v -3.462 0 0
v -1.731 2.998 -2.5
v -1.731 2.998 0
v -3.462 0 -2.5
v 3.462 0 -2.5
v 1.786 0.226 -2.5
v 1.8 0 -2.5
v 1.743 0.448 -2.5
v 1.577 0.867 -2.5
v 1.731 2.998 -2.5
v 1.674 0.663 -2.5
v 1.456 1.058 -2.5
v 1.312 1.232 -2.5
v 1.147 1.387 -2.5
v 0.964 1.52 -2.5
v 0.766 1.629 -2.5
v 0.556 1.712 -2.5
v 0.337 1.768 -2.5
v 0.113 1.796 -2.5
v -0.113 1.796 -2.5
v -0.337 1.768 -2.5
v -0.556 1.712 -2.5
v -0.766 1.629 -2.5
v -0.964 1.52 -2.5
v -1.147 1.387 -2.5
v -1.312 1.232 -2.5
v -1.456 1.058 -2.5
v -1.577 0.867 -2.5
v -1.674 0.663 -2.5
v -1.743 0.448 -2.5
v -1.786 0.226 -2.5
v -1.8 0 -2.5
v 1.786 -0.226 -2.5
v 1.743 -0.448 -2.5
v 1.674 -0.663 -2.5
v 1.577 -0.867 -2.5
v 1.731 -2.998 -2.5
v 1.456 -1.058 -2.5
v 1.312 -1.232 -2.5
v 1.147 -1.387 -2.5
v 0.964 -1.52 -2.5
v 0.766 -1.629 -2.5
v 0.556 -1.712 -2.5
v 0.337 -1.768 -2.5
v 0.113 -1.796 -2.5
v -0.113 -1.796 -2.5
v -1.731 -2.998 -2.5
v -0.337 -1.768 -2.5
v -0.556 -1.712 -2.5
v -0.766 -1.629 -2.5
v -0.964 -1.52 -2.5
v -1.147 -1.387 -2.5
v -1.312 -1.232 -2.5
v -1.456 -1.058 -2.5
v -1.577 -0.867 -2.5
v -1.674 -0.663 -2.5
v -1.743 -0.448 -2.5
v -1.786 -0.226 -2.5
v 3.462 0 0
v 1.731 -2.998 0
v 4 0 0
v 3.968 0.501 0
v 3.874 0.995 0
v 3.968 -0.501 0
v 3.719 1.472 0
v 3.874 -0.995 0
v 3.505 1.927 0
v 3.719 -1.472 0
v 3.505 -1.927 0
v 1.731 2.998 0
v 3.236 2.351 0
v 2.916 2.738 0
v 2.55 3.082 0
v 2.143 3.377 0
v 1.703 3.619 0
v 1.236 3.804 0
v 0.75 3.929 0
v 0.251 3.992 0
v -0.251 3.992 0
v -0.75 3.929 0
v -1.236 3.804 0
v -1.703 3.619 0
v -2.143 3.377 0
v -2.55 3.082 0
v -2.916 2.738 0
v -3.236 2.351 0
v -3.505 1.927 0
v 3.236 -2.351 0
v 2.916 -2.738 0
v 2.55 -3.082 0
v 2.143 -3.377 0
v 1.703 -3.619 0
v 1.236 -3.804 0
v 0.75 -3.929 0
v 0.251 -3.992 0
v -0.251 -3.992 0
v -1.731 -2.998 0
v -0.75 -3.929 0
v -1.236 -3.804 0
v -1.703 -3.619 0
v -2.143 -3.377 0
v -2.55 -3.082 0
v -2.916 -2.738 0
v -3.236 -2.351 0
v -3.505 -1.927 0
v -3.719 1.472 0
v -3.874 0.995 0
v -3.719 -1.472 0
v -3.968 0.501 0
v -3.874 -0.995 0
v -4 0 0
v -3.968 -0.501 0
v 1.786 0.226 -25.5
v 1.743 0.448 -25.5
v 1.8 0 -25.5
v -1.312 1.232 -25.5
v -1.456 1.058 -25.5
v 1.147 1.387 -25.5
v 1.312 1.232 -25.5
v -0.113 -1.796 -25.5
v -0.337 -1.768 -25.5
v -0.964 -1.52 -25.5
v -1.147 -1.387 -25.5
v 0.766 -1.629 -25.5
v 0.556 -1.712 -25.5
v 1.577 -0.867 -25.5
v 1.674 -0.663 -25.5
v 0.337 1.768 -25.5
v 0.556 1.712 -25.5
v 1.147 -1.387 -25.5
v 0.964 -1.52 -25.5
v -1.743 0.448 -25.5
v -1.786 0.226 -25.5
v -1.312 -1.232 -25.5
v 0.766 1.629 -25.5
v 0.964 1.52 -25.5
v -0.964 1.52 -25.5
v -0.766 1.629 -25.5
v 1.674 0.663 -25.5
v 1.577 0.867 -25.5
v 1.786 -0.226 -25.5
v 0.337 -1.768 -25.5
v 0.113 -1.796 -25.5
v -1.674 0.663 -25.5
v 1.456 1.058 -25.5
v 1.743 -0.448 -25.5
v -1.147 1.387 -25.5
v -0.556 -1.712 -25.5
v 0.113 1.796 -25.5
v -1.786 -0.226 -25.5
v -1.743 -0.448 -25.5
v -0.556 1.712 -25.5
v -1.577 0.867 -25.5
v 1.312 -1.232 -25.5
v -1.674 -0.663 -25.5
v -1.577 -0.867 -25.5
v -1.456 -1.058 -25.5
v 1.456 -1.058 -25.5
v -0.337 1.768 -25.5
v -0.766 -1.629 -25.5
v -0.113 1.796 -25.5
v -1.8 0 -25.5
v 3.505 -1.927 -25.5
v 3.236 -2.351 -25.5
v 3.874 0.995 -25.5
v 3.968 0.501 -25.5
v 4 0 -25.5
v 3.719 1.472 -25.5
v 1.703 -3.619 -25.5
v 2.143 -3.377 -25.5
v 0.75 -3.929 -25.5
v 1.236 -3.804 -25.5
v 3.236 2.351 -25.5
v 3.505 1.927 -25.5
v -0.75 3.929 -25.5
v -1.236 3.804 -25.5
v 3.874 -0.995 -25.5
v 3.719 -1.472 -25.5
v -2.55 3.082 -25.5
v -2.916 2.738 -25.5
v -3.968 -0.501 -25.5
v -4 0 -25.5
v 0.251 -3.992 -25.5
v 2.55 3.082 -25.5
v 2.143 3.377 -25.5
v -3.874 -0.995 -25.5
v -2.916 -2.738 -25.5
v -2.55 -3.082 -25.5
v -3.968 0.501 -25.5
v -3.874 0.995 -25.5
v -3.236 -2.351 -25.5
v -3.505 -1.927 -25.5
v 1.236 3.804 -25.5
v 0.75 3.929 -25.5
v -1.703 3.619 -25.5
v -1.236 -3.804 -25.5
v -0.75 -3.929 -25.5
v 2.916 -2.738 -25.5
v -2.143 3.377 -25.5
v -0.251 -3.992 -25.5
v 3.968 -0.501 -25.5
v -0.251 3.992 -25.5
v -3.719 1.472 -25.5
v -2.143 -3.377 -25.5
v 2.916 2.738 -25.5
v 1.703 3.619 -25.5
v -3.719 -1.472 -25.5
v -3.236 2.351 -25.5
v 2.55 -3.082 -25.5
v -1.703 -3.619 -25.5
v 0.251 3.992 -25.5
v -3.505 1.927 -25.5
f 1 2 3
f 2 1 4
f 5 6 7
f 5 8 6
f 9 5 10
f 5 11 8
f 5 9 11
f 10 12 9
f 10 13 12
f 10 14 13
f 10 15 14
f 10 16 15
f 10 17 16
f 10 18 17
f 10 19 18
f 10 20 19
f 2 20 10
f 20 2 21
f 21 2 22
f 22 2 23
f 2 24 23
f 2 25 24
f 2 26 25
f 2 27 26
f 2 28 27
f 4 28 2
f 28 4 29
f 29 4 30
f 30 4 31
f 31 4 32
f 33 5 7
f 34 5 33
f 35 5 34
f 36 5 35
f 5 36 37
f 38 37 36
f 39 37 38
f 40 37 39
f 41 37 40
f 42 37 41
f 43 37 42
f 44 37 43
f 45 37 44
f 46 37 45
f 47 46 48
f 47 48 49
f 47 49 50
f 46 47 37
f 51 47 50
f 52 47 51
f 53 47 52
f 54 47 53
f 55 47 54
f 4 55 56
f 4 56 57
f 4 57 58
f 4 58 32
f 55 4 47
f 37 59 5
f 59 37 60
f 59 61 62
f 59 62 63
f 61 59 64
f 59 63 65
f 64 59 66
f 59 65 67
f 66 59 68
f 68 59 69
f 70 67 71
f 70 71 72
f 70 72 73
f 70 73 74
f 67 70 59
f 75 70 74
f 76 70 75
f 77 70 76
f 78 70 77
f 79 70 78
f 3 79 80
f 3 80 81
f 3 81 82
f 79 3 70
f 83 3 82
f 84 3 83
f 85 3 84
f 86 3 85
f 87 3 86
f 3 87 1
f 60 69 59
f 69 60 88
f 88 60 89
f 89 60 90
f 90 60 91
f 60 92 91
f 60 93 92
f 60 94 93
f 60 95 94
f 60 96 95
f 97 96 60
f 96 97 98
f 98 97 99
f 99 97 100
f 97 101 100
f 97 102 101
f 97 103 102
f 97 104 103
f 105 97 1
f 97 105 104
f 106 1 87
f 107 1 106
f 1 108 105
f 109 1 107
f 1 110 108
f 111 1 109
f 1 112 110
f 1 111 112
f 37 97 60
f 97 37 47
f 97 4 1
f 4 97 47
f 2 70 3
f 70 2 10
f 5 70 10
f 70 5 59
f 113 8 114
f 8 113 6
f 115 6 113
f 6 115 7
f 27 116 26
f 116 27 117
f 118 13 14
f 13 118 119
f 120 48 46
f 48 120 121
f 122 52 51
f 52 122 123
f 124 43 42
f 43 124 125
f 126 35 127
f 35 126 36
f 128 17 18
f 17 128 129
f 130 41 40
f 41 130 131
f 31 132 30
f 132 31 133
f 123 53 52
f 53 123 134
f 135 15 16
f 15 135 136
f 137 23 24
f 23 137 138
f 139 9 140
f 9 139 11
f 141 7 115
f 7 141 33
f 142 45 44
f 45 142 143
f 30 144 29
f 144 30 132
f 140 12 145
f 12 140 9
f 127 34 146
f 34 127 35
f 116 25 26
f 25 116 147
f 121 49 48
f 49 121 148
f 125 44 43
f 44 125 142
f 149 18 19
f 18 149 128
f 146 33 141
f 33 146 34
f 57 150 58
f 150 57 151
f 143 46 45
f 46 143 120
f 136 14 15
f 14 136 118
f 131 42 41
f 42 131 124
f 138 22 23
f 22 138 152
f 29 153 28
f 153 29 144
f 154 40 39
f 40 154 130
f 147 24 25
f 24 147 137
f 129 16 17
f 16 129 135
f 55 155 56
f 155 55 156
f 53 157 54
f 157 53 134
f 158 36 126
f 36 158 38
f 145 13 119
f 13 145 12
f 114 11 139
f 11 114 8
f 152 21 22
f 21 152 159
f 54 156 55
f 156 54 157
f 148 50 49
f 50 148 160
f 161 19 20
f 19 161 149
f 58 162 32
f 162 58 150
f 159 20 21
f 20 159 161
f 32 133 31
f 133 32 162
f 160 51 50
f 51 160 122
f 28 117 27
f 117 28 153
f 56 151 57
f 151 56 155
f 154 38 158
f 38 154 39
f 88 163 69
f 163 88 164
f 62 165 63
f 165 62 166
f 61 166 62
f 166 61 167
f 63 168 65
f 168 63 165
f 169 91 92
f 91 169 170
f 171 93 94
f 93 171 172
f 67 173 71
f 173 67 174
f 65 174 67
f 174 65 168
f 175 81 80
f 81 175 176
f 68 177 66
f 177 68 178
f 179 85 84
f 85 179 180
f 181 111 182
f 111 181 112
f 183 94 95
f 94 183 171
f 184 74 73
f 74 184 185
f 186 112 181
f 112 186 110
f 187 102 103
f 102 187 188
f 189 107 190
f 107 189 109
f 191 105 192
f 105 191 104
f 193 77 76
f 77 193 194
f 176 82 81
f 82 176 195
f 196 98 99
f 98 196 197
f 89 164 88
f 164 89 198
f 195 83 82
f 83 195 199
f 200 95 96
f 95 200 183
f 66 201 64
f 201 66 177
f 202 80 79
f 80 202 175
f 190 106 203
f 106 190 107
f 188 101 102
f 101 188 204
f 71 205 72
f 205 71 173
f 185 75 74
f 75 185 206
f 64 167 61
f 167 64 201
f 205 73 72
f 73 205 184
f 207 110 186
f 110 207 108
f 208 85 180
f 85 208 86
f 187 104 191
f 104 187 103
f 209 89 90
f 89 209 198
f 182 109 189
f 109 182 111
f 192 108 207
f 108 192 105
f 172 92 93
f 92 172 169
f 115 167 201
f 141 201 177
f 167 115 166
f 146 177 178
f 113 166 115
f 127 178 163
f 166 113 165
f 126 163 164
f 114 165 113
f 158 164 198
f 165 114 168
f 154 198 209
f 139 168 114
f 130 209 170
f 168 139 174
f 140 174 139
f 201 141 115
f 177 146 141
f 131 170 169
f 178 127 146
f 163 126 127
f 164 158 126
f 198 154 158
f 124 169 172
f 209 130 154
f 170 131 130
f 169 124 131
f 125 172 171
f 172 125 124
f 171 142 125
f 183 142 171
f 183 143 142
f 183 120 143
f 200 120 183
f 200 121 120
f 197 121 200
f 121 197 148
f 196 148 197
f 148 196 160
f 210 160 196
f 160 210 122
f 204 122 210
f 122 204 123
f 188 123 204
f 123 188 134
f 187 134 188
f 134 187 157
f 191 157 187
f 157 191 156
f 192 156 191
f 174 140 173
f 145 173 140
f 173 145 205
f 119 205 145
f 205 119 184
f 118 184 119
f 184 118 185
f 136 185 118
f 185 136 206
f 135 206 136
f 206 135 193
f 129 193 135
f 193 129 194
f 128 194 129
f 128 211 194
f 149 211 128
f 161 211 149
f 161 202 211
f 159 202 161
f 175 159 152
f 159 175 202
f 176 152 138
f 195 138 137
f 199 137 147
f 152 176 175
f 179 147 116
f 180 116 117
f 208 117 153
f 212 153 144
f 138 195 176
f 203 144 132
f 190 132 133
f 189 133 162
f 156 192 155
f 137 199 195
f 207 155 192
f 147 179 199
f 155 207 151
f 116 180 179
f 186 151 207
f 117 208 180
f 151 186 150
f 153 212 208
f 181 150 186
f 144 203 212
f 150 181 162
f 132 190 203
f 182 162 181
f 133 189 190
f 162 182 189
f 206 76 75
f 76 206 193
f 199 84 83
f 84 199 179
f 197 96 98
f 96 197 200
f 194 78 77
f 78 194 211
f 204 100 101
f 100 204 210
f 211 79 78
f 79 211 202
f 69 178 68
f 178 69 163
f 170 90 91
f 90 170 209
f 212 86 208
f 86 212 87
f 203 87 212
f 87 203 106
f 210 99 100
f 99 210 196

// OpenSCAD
$fn = 50;

difference() {
	union() {
		translate(v = [0, 0, -25.5]) {
			cylinder(h = 25.5, r = 4.0);
		}
	}
	union() {
		translate(v = [0, 0, 0]) {
			rotate(a = [0, 0, 0]) {
				difference() {
					union() {
						translate(v = [0, 0, -2.5]) {
							linear_extrude(height = 2.5) {
								polygon(points = [[3.4619999999999997, 0.0], [1.7310000000000003, 2.9981799479017264], [-1.7309999999999992, 2.9981799479017264], [-3.4619999999999997, 4.2397272186481365e-16], [-1.7310000000000014, -2.998179947901726], [1.7309999999999977, -2.9981799479017277]]);
							}
						}
					}
					union();
				}
			}
		}
		#translate(v = [0, 0, -100.0]) {
			cylinder(h = 200, r = 1.8);
		}
	}
}
